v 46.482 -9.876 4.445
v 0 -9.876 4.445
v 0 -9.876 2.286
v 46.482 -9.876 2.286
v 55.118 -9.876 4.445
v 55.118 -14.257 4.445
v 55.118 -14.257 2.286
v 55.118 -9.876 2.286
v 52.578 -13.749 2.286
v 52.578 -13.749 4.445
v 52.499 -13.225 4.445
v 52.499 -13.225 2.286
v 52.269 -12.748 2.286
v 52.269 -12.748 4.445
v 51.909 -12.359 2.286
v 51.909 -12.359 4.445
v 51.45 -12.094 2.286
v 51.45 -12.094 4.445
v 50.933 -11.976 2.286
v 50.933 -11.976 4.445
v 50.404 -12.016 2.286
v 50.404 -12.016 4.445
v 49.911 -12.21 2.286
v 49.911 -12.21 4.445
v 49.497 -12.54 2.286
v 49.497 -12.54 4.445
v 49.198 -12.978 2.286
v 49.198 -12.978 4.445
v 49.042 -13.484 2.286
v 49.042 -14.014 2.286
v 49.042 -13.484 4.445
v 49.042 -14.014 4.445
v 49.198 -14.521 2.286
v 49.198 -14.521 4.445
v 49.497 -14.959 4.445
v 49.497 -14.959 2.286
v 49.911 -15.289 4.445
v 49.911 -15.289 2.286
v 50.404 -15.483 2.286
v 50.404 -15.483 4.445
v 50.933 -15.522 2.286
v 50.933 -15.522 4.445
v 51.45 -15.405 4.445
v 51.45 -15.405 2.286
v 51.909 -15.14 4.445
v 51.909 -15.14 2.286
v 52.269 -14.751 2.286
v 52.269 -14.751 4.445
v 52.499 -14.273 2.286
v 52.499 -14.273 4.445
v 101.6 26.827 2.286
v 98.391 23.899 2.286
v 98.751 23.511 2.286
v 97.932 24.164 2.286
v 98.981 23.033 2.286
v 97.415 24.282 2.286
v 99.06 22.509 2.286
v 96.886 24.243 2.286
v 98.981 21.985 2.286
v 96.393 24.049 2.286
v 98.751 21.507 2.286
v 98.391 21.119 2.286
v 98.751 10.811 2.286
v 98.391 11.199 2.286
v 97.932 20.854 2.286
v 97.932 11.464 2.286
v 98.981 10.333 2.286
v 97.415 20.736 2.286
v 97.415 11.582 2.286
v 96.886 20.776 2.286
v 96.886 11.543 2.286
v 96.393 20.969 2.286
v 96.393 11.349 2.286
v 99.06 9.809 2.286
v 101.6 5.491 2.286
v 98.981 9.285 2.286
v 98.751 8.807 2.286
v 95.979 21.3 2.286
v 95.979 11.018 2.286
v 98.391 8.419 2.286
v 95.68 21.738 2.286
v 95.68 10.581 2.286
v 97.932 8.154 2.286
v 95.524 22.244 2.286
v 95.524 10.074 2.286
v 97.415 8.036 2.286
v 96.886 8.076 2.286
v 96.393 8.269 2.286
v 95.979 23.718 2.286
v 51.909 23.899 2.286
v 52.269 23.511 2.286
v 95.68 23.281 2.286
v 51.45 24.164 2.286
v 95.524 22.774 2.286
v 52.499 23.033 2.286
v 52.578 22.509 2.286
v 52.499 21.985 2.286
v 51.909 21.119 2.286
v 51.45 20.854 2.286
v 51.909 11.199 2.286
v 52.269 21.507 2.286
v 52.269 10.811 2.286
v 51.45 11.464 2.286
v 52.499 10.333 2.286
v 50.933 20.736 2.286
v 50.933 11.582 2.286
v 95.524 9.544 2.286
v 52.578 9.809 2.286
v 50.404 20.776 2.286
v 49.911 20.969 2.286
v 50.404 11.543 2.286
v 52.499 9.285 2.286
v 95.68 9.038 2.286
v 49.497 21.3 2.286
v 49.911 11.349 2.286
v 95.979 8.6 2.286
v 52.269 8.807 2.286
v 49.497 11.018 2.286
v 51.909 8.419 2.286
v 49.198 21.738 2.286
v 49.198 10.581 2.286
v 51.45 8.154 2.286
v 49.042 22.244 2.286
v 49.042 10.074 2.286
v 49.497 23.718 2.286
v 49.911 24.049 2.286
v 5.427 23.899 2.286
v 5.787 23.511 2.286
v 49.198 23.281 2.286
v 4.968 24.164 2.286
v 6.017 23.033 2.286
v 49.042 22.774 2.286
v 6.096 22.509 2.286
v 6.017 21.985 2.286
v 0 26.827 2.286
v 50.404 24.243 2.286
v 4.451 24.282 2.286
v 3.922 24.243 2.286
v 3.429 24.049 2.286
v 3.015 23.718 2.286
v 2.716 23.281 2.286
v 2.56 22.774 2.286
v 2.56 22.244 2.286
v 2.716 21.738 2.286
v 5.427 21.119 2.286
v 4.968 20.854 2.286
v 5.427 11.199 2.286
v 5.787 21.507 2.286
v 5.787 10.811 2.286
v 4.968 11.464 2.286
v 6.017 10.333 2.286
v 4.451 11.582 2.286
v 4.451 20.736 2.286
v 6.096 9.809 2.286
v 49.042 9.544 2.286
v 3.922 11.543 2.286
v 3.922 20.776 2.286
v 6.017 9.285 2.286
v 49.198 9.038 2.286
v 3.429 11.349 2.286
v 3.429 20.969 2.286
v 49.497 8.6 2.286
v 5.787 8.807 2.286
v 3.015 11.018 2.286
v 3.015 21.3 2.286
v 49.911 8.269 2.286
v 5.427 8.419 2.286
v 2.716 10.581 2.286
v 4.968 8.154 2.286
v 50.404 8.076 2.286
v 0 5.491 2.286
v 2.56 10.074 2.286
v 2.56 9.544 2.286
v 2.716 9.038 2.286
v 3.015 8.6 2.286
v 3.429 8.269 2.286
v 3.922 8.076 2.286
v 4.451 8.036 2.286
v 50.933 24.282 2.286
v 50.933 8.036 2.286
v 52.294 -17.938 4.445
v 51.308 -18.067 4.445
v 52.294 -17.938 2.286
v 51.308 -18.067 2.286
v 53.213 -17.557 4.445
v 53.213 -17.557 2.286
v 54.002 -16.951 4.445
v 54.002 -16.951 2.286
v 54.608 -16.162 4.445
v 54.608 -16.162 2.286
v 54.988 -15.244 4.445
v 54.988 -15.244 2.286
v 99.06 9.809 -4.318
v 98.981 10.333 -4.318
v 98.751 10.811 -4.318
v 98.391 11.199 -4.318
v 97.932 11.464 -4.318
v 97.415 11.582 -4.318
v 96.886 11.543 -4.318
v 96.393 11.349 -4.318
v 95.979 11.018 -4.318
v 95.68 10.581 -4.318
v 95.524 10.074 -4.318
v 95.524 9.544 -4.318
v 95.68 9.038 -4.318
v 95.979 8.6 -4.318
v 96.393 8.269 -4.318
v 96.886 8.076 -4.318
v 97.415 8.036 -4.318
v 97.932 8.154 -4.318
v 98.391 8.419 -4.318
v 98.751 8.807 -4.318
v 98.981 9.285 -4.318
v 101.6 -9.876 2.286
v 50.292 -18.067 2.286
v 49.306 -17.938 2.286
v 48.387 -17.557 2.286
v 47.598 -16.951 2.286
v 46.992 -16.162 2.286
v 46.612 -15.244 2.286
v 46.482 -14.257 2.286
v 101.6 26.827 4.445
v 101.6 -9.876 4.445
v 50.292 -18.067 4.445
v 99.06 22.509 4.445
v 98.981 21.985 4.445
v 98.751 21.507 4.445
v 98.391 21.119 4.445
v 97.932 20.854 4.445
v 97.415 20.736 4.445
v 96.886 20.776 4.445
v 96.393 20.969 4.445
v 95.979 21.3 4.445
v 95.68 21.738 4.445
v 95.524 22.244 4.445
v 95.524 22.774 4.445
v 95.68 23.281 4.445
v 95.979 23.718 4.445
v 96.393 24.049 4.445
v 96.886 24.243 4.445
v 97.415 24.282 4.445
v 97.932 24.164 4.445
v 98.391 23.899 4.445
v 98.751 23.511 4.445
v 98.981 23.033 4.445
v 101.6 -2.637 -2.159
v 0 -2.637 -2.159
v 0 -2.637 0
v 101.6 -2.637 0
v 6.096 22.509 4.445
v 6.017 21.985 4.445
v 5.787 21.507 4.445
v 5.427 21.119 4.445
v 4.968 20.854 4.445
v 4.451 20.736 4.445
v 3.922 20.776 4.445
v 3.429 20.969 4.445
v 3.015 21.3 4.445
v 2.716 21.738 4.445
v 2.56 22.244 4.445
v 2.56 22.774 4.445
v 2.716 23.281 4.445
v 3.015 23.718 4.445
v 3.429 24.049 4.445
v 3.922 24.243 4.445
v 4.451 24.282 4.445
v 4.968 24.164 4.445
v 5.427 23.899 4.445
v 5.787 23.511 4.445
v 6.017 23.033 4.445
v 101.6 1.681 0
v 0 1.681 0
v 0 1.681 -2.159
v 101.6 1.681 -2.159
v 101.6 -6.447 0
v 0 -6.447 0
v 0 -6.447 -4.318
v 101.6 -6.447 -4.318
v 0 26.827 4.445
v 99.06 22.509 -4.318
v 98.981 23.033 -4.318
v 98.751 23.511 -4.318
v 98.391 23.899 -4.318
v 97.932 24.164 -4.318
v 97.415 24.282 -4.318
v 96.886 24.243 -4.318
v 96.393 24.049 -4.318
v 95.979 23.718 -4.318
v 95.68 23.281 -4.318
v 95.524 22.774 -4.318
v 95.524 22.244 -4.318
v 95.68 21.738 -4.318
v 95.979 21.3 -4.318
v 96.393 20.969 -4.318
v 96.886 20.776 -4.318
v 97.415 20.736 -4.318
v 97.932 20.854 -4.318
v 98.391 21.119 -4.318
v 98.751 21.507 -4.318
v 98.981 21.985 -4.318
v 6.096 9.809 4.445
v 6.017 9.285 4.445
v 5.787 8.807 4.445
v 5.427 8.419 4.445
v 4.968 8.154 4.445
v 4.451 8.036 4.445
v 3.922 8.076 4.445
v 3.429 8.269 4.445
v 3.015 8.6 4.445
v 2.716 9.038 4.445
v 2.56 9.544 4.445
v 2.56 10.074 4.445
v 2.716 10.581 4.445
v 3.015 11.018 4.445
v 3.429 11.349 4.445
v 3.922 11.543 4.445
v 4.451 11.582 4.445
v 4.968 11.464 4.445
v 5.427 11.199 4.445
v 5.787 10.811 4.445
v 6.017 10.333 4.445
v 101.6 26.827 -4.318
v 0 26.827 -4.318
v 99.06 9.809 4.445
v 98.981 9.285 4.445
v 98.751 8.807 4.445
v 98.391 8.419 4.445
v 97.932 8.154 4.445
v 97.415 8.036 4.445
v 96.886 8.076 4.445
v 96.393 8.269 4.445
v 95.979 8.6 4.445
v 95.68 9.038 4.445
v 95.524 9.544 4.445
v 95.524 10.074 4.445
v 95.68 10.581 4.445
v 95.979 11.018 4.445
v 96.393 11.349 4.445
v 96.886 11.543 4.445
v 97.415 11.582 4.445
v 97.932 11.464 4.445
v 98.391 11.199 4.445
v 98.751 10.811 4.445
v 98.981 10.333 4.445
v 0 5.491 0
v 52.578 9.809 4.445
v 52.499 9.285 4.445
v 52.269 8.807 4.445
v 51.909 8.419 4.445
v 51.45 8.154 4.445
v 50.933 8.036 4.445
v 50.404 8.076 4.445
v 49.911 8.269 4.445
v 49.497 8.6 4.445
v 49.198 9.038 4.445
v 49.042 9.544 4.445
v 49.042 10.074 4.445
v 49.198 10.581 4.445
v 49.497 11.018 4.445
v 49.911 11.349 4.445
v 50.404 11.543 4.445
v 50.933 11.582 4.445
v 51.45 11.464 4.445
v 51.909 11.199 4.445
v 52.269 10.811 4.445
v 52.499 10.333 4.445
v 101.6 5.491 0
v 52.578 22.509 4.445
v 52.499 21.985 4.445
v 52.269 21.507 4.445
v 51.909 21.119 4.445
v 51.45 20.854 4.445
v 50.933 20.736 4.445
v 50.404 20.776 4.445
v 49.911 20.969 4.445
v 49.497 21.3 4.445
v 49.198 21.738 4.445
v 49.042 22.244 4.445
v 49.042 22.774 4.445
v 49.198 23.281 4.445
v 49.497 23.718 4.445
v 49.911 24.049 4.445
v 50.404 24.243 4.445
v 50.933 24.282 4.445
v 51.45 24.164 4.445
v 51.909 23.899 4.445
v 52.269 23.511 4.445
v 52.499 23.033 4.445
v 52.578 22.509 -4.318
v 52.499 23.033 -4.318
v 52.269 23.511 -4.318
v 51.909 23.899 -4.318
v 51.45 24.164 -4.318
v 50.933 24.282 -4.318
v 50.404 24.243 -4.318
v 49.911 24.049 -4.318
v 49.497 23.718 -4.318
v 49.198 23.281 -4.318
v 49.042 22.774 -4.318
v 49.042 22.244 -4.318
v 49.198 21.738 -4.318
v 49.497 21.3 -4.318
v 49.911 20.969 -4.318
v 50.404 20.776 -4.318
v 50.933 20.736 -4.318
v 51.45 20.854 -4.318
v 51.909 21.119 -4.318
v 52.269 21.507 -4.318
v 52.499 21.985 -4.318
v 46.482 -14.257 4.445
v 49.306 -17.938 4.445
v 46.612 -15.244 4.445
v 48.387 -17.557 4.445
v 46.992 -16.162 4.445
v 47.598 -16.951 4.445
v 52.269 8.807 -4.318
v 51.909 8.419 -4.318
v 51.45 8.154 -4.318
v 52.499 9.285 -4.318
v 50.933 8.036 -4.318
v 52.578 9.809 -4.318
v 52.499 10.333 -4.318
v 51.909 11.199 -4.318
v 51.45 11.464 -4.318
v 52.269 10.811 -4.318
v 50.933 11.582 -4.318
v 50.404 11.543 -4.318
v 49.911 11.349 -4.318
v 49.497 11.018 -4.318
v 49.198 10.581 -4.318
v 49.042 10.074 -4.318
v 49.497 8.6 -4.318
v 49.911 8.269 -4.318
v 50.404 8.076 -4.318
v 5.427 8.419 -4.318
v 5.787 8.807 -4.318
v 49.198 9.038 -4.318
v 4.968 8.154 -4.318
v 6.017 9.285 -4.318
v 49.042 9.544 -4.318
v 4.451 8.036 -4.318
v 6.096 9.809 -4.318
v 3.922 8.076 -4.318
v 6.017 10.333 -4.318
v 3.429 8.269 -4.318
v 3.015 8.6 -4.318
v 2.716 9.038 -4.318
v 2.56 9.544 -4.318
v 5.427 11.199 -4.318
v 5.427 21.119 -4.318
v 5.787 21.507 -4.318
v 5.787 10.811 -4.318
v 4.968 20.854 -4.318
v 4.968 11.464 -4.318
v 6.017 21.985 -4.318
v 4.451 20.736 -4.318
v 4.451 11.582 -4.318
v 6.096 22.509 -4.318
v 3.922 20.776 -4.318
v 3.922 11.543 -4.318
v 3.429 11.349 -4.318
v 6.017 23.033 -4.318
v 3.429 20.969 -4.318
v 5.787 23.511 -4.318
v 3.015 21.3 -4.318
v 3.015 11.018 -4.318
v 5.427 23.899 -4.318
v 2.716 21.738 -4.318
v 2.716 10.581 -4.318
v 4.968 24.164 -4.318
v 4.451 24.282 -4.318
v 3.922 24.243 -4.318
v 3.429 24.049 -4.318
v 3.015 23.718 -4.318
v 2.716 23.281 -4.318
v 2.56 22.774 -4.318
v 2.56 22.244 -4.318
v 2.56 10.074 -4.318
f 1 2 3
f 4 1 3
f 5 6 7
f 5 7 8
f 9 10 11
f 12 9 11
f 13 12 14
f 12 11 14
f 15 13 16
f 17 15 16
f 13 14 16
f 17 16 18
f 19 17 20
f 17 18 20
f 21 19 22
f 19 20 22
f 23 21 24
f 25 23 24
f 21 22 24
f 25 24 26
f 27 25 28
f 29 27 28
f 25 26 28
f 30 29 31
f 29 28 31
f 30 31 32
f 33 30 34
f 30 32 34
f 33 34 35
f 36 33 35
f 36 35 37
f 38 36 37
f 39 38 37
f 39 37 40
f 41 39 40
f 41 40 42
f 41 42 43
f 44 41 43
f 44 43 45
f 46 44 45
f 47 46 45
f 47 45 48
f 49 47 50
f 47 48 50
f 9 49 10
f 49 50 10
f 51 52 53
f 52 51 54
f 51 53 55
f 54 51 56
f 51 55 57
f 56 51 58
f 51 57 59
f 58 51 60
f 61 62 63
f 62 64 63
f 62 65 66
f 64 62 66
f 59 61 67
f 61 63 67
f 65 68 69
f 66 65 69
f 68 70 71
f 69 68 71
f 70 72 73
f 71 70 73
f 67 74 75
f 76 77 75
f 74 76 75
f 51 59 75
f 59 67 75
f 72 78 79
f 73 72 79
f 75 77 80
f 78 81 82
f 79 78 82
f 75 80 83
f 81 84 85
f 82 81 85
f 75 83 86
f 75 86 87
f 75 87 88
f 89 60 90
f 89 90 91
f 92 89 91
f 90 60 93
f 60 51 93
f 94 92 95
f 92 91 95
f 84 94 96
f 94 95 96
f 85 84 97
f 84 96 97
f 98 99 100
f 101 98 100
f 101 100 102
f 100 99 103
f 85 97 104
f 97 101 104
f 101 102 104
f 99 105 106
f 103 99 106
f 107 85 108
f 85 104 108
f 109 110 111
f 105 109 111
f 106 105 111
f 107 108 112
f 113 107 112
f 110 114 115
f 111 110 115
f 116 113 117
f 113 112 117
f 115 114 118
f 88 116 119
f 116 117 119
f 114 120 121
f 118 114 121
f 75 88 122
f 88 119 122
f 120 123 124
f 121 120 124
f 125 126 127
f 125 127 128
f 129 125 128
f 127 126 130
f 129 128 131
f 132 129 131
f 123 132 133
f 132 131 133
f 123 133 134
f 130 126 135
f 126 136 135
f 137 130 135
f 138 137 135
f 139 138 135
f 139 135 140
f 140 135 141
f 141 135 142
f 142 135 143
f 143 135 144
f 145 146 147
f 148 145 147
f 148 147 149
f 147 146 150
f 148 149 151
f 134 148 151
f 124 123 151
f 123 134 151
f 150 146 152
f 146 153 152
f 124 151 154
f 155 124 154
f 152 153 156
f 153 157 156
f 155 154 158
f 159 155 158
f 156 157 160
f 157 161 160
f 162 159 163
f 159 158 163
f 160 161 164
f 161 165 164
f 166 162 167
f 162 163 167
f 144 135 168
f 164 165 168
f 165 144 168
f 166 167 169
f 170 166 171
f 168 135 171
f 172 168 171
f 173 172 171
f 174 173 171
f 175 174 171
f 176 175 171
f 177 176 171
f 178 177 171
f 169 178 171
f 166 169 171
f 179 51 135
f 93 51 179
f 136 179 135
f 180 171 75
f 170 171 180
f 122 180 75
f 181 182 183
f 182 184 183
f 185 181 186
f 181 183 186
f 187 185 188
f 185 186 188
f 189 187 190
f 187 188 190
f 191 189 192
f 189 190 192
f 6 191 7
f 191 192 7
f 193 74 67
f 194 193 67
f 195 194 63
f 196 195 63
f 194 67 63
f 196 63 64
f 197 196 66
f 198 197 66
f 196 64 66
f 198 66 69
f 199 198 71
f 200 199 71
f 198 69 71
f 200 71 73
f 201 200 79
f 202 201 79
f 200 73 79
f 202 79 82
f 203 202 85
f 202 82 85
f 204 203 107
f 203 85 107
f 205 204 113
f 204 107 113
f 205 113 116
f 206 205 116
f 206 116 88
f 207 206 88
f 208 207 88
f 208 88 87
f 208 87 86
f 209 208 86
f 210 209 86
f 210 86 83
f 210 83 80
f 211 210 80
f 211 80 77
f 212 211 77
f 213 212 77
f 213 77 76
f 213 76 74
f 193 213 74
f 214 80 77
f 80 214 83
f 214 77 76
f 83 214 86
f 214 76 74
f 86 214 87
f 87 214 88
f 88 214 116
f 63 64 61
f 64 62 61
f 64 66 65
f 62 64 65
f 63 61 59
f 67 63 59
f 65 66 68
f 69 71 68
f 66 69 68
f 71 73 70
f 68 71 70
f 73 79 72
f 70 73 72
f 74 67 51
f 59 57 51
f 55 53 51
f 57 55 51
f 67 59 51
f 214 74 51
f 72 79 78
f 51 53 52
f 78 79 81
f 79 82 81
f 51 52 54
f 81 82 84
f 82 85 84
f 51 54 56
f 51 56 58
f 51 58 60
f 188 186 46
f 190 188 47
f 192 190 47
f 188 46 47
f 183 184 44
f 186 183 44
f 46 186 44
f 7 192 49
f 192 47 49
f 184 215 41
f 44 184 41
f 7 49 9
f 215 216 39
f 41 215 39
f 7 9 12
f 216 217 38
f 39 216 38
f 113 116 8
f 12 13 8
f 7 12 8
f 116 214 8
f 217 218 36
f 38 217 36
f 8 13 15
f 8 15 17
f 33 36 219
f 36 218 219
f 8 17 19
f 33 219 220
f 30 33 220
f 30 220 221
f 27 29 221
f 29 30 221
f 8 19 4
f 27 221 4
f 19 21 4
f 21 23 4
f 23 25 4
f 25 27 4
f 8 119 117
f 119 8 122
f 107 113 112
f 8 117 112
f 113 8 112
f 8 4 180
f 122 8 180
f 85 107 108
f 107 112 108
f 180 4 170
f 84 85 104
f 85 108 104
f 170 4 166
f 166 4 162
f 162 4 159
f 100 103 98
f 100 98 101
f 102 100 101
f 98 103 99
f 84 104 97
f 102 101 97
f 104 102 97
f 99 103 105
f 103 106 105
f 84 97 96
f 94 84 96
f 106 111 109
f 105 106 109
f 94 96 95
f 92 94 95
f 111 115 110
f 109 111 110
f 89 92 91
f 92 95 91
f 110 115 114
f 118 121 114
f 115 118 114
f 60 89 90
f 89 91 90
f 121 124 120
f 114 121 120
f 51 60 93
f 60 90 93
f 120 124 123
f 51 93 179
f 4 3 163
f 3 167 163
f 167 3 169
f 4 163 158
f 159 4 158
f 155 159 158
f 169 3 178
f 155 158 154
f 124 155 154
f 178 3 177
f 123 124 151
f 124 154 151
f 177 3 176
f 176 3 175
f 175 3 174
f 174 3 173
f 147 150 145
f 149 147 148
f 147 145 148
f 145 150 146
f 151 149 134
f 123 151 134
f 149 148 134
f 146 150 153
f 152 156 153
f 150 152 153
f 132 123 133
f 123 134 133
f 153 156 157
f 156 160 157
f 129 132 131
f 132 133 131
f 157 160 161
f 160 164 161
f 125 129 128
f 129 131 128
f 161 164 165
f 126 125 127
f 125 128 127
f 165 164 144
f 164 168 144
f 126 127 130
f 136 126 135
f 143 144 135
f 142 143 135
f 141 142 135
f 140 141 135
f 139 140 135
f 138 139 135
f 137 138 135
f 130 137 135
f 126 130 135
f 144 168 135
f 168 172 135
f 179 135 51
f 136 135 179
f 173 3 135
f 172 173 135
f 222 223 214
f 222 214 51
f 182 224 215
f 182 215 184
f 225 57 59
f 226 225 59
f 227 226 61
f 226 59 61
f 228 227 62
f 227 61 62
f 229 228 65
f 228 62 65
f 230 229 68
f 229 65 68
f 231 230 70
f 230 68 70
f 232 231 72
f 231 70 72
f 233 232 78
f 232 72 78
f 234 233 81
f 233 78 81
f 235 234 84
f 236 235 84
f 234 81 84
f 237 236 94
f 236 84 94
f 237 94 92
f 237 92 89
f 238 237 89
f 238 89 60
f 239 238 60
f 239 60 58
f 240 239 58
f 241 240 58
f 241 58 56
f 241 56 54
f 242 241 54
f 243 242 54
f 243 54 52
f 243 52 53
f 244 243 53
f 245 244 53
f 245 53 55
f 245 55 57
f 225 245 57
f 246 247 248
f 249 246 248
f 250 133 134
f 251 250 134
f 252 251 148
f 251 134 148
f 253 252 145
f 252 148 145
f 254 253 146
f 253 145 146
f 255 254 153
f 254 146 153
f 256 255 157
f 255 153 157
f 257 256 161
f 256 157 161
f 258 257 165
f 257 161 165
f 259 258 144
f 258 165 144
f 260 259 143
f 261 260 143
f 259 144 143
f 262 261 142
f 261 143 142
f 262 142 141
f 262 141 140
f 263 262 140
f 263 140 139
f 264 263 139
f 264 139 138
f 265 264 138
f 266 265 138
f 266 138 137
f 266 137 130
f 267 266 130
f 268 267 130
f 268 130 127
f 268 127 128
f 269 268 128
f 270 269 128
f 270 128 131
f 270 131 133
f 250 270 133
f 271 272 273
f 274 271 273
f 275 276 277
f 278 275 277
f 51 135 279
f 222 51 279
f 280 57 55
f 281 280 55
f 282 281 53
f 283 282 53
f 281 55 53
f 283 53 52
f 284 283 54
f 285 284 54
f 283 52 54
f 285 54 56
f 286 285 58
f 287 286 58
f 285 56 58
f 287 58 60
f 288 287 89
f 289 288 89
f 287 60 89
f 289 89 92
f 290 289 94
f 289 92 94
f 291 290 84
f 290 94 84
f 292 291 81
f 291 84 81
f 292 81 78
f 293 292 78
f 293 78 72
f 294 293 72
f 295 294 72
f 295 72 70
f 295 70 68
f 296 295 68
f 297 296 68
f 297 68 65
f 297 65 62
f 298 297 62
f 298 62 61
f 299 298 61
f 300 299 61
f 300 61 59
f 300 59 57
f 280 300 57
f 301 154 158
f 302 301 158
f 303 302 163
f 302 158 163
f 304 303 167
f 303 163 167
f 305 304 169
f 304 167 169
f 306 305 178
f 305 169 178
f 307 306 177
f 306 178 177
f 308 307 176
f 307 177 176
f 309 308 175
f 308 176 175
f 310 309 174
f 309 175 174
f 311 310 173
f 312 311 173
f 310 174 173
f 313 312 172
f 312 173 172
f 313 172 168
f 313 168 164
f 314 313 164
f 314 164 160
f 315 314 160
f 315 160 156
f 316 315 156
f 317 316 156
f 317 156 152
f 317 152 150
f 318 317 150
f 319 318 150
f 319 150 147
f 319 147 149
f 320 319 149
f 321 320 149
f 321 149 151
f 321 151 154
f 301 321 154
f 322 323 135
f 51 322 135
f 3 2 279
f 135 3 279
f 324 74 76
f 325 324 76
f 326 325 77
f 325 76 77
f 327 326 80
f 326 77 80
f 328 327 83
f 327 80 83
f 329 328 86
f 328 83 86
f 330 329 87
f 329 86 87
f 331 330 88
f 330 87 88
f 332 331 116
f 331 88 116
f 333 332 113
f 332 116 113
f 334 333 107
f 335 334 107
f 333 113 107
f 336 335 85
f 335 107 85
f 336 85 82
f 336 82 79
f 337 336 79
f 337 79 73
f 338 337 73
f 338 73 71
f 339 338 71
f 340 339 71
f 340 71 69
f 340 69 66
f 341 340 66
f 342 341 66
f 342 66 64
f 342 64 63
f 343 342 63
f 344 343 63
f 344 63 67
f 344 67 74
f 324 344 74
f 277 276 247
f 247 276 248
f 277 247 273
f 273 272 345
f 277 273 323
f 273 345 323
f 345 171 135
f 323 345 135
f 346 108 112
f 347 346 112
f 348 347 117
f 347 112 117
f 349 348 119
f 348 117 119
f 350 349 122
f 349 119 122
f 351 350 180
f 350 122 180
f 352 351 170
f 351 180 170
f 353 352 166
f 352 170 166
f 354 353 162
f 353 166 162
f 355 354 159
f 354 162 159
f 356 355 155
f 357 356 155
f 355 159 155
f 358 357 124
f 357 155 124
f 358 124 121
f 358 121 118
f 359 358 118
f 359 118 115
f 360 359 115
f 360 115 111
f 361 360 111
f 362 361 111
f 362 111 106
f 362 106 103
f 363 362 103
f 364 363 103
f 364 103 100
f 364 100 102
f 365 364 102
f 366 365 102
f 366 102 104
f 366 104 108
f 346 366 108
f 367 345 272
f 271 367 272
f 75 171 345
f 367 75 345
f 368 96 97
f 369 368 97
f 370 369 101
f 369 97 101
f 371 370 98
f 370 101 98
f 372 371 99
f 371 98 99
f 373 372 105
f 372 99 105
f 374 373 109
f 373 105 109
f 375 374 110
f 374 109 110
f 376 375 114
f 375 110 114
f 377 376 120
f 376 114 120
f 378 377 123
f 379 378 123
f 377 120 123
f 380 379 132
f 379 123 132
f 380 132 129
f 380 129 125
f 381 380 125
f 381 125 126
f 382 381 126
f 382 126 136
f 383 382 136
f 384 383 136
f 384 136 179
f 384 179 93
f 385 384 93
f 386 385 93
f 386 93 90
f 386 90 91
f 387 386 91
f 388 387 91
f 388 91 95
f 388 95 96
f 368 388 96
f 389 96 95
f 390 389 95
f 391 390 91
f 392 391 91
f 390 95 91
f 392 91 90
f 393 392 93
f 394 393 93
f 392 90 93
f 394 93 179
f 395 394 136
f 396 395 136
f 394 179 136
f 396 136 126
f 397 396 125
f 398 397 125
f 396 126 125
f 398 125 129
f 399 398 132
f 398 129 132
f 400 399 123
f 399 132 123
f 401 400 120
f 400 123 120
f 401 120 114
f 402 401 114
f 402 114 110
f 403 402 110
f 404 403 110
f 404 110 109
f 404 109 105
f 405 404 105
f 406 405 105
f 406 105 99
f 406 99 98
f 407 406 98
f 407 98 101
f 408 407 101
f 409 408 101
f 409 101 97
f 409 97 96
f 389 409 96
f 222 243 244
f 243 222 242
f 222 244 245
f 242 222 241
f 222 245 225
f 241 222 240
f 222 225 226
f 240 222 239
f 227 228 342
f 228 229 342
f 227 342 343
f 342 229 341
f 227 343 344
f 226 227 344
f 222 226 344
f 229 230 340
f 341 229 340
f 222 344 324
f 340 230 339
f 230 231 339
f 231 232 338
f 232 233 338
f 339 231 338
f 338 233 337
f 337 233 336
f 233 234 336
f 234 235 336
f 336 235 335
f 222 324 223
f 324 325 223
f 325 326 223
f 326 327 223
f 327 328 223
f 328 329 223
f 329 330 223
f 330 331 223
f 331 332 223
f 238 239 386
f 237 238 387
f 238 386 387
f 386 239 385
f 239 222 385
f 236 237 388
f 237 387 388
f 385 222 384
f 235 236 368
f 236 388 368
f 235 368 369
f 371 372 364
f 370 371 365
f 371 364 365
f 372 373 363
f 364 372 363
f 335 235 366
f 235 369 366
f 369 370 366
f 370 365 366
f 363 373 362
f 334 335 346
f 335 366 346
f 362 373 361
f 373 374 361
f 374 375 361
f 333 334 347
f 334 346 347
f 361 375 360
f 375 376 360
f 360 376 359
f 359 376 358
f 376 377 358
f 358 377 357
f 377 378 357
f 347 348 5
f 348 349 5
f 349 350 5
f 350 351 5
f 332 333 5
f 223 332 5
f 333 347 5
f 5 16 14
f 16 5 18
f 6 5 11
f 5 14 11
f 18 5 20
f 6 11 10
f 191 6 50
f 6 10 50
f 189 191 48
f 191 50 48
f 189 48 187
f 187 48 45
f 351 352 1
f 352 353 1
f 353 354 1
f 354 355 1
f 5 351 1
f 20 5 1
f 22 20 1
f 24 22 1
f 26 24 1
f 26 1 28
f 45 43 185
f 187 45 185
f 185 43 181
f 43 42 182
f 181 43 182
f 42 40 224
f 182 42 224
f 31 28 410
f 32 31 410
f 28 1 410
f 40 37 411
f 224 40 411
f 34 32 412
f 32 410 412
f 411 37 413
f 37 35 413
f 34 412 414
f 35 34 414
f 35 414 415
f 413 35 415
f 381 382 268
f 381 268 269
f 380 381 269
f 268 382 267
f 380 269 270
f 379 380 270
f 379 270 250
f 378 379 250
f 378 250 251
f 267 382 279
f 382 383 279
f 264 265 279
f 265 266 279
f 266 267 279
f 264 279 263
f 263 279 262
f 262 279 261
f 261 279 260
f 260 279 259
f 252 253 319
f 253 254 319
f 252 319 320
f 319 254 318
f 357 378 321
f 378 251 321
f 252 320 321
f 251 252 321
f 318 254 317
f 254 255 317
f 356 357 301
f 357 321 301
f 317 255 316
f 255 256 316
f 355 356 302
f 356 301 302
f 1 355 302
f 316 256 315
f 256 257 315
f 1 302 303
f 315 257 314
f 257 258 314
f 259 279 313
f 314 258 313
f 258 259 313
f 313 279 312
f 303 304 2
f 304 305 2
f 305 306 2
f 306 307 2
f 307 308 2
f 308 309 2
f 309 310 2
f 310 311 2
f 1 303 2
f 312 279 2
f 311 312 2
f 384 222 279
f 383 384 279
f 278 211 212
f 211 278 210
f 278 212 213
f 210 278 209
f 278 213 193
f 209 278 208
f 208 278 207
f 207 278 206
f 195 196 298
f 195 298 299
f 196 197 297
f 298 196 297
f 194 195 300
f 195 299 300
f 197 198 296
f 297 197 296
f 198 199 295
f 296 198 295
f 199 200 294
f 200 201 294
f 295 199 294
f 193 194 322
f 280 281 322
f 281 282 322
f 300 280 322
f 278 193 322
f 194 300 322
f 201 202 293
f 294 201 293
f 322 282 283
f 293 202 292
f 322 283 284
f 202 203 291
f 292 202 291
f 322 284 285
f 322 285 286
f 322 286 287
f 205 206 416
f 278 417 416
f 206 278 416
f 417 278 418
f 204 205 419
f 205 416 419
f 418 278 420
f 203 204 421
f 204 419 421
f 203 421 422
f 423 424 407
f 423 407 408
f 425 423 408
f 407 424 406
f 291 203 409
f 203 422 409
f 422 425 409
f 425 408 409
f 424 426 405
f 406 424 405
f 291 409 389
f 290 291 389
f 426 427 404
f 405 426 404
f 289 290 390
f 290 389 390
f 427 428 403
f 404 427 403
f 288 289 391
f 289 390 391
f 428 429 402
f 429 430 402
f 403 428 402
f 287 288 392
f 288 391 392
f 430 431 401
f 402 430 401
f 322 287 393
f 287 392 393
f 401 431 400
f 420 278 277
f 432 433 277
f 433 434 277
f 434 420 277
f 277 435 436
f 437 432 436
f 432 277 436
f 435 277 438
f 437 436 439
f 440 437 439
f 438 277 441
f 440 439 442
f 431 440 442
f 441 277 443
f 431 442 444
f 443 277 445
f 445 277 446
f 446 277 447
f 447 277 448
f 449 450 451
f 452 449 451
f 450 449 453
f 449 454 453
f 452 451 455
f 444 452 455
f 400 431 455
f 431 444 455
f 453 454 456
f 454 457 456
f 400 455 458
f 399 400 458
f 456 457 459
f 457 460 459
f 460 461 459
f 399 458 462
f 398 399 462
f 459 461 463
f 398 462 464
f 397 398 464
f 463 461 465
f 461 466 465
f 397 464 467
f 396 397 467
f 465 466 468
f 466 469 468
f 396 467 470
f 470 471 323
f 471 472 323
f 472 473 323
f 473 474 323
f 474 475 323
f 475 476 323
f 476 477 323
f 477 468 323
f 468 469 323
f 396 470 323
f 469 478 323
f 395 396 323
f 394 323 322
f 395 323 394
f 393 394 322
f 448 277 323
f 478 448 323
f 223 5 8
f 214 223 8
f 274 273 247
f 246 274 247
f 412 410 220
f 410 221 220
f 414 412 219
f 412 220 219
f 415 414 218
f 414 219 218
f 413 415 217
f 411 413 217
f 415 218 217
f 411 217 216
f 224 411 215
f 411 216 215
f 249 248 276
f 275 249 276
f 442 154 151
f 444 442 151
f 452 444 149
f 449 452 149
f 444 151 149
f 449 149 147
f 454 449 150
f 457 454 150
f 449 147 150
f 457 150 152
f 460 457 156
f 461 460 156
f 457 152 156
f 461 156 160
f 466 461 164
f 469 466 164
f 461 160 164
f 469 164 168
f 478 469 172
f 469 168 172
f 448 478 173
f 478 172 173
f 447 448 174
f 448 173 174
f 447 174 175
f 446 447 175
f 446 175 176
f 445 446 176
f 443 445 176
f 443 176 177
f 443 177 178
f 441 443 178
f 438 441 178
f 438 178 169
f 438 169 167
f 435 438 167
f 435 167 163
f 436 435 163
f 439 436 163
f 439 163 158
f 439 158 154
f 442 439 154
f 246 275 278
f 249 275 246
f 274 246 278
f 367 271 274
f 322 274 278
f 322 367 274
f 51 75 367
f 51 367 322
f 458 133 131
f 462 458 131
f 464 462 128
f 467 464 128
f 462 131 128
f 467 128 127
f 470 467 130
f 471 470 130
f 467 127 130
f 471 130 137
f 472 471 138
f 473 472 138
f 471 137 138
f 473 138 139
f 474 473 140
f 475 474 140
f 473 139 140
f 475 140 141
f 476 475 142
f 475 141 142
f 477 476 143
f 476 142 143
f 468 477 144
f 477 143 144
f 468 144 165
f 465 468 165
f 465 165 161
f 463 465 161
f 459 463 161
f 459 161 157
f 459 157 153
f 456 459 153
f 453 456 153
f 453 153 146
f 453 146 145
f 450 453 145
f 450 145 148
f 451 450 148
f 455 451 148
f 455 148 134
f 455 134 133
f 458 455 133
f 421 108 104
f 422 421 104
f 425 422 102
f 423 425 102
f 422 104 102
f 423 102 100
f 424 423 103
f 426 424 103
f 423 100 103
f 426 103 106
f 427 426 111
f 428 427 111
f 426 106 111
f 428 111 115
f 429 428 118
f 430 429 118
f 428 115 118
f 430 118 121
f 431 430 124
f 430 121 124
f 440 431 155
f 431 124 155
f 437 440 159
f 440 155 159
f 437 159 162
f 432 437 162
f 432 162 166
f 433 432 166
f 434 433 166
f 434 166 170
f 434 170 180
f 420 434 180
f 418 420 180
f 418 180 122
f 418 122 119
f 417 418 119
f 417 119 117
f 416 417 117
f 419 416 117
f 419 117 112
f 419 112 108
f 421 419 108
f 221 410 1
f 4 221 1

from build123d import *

# Parameters (mm, degrees)
F1_DEPTH = 101.6
F2_R     = 1.778
F3_DEPTH = 6.605
F5_DEPTH = 101.6
F6_R     = 1.778
F7_DEPTH = 2.16
F8_W     = 8.636
F8_H     = 8.1915
F8_R     = 1.778
F9_DEPTH = 2.159
F10_R    = 3.81


with BuildPart() as f1:
    # F0 (on Right) → F1 (new body)
    with BuildSketch(Plane.YZ):
        Polygon((-6.446921, 0), (-6.446921, -4.318), (26.827079, -4.318), (26.827079, 0), (26.827079, 2.286), (5.491079, 2.286), (5.491079, 0), (1.681079, 0), (1.681079, -2.159), (-2.636921, -2.159), (-2.636921, 0), align=None)
    extrude(amount=F1_DEPTH)

    # F2 (on face) → F3 (cut, through all)
    with BuildSketch(Plane.XY.offset(2.286)):
        with Locations((97.282, 9.809079)):
            Circle(F2_R)
        with Locations((97.282, 22.509079)):
            Circle(F2_R)
        with Locations((4.318, 9.809079)):
            Circle(F2_R)
        with Locations((4.318, 22.509079)):
            Circle(F2_R)
        with Locations((50.8, 9.809079)):
            Circle(F2_R)
        with Locations((50.8, 22.509079)):
            Circle(F2_R)
    extrude(amount=-F3_DEPTH, mode=Mode.SUBTRACT)


with BuildPart() as f5:
    # F4 (on Right) → F5 (new body, through all)
    with BuildSketch(Plane.YZ):
        Polygon((-9.875921, 4.445), (-9.875921, 2.286), (5.491079, 2.286), (26.827079, 2.286), (26.827079, 4.445), align=None)
    extrude(amount=F5_DEPTH)

    # F6 (on face) → F7 (cut, through all)
    with BuildSketch(Plane(origin=(0, 0, 2.286), x_dir=(1, 0, 0), z_dir=(0, 0, -1))):
        with Locations((97.282, -9.809079)):
            Circle(F6_R)
        with Locations((50.8, -9.809079)):
            Circle(F6_R)
        with Locations((4.318, -9.809079)):
            Circle(F6_R)
        with Locations((4.318, -22.509079)):
            Circle(F6_R)
        with Locations((50.8, -22.509079)):
            Circle(F6_R)
        with Locations((97.282, -22.509079)):
            Circle(F6_R)
    extrude(amount=-F7_DEPTH, mode=Mode.SUBTRACT)

    # F8 (on face) → F9 (join, through all)
    with BuildSketch(Plane.XY.offset(4.445)):
        with Locations((50.8, -13.971671)):
            Rectangle(F8_W, F8_H)
        with Locations((50.8, -13.749421)):
            Circle(F8_R, mode=Mode.SUBTRACT)
    extrude(amount=-F9_DEPTH)

    # F10
    f10_edges = [f5.edges().sort_by_distance(p)[0] for p in [
        (55.118, -18.067421, 3.3655),
        (46.482, -18.067421, 3.3655),
    ]]
    fillet(f10_edges, radius=F10_R)


solid = Compound([f1.part, f5.part])
